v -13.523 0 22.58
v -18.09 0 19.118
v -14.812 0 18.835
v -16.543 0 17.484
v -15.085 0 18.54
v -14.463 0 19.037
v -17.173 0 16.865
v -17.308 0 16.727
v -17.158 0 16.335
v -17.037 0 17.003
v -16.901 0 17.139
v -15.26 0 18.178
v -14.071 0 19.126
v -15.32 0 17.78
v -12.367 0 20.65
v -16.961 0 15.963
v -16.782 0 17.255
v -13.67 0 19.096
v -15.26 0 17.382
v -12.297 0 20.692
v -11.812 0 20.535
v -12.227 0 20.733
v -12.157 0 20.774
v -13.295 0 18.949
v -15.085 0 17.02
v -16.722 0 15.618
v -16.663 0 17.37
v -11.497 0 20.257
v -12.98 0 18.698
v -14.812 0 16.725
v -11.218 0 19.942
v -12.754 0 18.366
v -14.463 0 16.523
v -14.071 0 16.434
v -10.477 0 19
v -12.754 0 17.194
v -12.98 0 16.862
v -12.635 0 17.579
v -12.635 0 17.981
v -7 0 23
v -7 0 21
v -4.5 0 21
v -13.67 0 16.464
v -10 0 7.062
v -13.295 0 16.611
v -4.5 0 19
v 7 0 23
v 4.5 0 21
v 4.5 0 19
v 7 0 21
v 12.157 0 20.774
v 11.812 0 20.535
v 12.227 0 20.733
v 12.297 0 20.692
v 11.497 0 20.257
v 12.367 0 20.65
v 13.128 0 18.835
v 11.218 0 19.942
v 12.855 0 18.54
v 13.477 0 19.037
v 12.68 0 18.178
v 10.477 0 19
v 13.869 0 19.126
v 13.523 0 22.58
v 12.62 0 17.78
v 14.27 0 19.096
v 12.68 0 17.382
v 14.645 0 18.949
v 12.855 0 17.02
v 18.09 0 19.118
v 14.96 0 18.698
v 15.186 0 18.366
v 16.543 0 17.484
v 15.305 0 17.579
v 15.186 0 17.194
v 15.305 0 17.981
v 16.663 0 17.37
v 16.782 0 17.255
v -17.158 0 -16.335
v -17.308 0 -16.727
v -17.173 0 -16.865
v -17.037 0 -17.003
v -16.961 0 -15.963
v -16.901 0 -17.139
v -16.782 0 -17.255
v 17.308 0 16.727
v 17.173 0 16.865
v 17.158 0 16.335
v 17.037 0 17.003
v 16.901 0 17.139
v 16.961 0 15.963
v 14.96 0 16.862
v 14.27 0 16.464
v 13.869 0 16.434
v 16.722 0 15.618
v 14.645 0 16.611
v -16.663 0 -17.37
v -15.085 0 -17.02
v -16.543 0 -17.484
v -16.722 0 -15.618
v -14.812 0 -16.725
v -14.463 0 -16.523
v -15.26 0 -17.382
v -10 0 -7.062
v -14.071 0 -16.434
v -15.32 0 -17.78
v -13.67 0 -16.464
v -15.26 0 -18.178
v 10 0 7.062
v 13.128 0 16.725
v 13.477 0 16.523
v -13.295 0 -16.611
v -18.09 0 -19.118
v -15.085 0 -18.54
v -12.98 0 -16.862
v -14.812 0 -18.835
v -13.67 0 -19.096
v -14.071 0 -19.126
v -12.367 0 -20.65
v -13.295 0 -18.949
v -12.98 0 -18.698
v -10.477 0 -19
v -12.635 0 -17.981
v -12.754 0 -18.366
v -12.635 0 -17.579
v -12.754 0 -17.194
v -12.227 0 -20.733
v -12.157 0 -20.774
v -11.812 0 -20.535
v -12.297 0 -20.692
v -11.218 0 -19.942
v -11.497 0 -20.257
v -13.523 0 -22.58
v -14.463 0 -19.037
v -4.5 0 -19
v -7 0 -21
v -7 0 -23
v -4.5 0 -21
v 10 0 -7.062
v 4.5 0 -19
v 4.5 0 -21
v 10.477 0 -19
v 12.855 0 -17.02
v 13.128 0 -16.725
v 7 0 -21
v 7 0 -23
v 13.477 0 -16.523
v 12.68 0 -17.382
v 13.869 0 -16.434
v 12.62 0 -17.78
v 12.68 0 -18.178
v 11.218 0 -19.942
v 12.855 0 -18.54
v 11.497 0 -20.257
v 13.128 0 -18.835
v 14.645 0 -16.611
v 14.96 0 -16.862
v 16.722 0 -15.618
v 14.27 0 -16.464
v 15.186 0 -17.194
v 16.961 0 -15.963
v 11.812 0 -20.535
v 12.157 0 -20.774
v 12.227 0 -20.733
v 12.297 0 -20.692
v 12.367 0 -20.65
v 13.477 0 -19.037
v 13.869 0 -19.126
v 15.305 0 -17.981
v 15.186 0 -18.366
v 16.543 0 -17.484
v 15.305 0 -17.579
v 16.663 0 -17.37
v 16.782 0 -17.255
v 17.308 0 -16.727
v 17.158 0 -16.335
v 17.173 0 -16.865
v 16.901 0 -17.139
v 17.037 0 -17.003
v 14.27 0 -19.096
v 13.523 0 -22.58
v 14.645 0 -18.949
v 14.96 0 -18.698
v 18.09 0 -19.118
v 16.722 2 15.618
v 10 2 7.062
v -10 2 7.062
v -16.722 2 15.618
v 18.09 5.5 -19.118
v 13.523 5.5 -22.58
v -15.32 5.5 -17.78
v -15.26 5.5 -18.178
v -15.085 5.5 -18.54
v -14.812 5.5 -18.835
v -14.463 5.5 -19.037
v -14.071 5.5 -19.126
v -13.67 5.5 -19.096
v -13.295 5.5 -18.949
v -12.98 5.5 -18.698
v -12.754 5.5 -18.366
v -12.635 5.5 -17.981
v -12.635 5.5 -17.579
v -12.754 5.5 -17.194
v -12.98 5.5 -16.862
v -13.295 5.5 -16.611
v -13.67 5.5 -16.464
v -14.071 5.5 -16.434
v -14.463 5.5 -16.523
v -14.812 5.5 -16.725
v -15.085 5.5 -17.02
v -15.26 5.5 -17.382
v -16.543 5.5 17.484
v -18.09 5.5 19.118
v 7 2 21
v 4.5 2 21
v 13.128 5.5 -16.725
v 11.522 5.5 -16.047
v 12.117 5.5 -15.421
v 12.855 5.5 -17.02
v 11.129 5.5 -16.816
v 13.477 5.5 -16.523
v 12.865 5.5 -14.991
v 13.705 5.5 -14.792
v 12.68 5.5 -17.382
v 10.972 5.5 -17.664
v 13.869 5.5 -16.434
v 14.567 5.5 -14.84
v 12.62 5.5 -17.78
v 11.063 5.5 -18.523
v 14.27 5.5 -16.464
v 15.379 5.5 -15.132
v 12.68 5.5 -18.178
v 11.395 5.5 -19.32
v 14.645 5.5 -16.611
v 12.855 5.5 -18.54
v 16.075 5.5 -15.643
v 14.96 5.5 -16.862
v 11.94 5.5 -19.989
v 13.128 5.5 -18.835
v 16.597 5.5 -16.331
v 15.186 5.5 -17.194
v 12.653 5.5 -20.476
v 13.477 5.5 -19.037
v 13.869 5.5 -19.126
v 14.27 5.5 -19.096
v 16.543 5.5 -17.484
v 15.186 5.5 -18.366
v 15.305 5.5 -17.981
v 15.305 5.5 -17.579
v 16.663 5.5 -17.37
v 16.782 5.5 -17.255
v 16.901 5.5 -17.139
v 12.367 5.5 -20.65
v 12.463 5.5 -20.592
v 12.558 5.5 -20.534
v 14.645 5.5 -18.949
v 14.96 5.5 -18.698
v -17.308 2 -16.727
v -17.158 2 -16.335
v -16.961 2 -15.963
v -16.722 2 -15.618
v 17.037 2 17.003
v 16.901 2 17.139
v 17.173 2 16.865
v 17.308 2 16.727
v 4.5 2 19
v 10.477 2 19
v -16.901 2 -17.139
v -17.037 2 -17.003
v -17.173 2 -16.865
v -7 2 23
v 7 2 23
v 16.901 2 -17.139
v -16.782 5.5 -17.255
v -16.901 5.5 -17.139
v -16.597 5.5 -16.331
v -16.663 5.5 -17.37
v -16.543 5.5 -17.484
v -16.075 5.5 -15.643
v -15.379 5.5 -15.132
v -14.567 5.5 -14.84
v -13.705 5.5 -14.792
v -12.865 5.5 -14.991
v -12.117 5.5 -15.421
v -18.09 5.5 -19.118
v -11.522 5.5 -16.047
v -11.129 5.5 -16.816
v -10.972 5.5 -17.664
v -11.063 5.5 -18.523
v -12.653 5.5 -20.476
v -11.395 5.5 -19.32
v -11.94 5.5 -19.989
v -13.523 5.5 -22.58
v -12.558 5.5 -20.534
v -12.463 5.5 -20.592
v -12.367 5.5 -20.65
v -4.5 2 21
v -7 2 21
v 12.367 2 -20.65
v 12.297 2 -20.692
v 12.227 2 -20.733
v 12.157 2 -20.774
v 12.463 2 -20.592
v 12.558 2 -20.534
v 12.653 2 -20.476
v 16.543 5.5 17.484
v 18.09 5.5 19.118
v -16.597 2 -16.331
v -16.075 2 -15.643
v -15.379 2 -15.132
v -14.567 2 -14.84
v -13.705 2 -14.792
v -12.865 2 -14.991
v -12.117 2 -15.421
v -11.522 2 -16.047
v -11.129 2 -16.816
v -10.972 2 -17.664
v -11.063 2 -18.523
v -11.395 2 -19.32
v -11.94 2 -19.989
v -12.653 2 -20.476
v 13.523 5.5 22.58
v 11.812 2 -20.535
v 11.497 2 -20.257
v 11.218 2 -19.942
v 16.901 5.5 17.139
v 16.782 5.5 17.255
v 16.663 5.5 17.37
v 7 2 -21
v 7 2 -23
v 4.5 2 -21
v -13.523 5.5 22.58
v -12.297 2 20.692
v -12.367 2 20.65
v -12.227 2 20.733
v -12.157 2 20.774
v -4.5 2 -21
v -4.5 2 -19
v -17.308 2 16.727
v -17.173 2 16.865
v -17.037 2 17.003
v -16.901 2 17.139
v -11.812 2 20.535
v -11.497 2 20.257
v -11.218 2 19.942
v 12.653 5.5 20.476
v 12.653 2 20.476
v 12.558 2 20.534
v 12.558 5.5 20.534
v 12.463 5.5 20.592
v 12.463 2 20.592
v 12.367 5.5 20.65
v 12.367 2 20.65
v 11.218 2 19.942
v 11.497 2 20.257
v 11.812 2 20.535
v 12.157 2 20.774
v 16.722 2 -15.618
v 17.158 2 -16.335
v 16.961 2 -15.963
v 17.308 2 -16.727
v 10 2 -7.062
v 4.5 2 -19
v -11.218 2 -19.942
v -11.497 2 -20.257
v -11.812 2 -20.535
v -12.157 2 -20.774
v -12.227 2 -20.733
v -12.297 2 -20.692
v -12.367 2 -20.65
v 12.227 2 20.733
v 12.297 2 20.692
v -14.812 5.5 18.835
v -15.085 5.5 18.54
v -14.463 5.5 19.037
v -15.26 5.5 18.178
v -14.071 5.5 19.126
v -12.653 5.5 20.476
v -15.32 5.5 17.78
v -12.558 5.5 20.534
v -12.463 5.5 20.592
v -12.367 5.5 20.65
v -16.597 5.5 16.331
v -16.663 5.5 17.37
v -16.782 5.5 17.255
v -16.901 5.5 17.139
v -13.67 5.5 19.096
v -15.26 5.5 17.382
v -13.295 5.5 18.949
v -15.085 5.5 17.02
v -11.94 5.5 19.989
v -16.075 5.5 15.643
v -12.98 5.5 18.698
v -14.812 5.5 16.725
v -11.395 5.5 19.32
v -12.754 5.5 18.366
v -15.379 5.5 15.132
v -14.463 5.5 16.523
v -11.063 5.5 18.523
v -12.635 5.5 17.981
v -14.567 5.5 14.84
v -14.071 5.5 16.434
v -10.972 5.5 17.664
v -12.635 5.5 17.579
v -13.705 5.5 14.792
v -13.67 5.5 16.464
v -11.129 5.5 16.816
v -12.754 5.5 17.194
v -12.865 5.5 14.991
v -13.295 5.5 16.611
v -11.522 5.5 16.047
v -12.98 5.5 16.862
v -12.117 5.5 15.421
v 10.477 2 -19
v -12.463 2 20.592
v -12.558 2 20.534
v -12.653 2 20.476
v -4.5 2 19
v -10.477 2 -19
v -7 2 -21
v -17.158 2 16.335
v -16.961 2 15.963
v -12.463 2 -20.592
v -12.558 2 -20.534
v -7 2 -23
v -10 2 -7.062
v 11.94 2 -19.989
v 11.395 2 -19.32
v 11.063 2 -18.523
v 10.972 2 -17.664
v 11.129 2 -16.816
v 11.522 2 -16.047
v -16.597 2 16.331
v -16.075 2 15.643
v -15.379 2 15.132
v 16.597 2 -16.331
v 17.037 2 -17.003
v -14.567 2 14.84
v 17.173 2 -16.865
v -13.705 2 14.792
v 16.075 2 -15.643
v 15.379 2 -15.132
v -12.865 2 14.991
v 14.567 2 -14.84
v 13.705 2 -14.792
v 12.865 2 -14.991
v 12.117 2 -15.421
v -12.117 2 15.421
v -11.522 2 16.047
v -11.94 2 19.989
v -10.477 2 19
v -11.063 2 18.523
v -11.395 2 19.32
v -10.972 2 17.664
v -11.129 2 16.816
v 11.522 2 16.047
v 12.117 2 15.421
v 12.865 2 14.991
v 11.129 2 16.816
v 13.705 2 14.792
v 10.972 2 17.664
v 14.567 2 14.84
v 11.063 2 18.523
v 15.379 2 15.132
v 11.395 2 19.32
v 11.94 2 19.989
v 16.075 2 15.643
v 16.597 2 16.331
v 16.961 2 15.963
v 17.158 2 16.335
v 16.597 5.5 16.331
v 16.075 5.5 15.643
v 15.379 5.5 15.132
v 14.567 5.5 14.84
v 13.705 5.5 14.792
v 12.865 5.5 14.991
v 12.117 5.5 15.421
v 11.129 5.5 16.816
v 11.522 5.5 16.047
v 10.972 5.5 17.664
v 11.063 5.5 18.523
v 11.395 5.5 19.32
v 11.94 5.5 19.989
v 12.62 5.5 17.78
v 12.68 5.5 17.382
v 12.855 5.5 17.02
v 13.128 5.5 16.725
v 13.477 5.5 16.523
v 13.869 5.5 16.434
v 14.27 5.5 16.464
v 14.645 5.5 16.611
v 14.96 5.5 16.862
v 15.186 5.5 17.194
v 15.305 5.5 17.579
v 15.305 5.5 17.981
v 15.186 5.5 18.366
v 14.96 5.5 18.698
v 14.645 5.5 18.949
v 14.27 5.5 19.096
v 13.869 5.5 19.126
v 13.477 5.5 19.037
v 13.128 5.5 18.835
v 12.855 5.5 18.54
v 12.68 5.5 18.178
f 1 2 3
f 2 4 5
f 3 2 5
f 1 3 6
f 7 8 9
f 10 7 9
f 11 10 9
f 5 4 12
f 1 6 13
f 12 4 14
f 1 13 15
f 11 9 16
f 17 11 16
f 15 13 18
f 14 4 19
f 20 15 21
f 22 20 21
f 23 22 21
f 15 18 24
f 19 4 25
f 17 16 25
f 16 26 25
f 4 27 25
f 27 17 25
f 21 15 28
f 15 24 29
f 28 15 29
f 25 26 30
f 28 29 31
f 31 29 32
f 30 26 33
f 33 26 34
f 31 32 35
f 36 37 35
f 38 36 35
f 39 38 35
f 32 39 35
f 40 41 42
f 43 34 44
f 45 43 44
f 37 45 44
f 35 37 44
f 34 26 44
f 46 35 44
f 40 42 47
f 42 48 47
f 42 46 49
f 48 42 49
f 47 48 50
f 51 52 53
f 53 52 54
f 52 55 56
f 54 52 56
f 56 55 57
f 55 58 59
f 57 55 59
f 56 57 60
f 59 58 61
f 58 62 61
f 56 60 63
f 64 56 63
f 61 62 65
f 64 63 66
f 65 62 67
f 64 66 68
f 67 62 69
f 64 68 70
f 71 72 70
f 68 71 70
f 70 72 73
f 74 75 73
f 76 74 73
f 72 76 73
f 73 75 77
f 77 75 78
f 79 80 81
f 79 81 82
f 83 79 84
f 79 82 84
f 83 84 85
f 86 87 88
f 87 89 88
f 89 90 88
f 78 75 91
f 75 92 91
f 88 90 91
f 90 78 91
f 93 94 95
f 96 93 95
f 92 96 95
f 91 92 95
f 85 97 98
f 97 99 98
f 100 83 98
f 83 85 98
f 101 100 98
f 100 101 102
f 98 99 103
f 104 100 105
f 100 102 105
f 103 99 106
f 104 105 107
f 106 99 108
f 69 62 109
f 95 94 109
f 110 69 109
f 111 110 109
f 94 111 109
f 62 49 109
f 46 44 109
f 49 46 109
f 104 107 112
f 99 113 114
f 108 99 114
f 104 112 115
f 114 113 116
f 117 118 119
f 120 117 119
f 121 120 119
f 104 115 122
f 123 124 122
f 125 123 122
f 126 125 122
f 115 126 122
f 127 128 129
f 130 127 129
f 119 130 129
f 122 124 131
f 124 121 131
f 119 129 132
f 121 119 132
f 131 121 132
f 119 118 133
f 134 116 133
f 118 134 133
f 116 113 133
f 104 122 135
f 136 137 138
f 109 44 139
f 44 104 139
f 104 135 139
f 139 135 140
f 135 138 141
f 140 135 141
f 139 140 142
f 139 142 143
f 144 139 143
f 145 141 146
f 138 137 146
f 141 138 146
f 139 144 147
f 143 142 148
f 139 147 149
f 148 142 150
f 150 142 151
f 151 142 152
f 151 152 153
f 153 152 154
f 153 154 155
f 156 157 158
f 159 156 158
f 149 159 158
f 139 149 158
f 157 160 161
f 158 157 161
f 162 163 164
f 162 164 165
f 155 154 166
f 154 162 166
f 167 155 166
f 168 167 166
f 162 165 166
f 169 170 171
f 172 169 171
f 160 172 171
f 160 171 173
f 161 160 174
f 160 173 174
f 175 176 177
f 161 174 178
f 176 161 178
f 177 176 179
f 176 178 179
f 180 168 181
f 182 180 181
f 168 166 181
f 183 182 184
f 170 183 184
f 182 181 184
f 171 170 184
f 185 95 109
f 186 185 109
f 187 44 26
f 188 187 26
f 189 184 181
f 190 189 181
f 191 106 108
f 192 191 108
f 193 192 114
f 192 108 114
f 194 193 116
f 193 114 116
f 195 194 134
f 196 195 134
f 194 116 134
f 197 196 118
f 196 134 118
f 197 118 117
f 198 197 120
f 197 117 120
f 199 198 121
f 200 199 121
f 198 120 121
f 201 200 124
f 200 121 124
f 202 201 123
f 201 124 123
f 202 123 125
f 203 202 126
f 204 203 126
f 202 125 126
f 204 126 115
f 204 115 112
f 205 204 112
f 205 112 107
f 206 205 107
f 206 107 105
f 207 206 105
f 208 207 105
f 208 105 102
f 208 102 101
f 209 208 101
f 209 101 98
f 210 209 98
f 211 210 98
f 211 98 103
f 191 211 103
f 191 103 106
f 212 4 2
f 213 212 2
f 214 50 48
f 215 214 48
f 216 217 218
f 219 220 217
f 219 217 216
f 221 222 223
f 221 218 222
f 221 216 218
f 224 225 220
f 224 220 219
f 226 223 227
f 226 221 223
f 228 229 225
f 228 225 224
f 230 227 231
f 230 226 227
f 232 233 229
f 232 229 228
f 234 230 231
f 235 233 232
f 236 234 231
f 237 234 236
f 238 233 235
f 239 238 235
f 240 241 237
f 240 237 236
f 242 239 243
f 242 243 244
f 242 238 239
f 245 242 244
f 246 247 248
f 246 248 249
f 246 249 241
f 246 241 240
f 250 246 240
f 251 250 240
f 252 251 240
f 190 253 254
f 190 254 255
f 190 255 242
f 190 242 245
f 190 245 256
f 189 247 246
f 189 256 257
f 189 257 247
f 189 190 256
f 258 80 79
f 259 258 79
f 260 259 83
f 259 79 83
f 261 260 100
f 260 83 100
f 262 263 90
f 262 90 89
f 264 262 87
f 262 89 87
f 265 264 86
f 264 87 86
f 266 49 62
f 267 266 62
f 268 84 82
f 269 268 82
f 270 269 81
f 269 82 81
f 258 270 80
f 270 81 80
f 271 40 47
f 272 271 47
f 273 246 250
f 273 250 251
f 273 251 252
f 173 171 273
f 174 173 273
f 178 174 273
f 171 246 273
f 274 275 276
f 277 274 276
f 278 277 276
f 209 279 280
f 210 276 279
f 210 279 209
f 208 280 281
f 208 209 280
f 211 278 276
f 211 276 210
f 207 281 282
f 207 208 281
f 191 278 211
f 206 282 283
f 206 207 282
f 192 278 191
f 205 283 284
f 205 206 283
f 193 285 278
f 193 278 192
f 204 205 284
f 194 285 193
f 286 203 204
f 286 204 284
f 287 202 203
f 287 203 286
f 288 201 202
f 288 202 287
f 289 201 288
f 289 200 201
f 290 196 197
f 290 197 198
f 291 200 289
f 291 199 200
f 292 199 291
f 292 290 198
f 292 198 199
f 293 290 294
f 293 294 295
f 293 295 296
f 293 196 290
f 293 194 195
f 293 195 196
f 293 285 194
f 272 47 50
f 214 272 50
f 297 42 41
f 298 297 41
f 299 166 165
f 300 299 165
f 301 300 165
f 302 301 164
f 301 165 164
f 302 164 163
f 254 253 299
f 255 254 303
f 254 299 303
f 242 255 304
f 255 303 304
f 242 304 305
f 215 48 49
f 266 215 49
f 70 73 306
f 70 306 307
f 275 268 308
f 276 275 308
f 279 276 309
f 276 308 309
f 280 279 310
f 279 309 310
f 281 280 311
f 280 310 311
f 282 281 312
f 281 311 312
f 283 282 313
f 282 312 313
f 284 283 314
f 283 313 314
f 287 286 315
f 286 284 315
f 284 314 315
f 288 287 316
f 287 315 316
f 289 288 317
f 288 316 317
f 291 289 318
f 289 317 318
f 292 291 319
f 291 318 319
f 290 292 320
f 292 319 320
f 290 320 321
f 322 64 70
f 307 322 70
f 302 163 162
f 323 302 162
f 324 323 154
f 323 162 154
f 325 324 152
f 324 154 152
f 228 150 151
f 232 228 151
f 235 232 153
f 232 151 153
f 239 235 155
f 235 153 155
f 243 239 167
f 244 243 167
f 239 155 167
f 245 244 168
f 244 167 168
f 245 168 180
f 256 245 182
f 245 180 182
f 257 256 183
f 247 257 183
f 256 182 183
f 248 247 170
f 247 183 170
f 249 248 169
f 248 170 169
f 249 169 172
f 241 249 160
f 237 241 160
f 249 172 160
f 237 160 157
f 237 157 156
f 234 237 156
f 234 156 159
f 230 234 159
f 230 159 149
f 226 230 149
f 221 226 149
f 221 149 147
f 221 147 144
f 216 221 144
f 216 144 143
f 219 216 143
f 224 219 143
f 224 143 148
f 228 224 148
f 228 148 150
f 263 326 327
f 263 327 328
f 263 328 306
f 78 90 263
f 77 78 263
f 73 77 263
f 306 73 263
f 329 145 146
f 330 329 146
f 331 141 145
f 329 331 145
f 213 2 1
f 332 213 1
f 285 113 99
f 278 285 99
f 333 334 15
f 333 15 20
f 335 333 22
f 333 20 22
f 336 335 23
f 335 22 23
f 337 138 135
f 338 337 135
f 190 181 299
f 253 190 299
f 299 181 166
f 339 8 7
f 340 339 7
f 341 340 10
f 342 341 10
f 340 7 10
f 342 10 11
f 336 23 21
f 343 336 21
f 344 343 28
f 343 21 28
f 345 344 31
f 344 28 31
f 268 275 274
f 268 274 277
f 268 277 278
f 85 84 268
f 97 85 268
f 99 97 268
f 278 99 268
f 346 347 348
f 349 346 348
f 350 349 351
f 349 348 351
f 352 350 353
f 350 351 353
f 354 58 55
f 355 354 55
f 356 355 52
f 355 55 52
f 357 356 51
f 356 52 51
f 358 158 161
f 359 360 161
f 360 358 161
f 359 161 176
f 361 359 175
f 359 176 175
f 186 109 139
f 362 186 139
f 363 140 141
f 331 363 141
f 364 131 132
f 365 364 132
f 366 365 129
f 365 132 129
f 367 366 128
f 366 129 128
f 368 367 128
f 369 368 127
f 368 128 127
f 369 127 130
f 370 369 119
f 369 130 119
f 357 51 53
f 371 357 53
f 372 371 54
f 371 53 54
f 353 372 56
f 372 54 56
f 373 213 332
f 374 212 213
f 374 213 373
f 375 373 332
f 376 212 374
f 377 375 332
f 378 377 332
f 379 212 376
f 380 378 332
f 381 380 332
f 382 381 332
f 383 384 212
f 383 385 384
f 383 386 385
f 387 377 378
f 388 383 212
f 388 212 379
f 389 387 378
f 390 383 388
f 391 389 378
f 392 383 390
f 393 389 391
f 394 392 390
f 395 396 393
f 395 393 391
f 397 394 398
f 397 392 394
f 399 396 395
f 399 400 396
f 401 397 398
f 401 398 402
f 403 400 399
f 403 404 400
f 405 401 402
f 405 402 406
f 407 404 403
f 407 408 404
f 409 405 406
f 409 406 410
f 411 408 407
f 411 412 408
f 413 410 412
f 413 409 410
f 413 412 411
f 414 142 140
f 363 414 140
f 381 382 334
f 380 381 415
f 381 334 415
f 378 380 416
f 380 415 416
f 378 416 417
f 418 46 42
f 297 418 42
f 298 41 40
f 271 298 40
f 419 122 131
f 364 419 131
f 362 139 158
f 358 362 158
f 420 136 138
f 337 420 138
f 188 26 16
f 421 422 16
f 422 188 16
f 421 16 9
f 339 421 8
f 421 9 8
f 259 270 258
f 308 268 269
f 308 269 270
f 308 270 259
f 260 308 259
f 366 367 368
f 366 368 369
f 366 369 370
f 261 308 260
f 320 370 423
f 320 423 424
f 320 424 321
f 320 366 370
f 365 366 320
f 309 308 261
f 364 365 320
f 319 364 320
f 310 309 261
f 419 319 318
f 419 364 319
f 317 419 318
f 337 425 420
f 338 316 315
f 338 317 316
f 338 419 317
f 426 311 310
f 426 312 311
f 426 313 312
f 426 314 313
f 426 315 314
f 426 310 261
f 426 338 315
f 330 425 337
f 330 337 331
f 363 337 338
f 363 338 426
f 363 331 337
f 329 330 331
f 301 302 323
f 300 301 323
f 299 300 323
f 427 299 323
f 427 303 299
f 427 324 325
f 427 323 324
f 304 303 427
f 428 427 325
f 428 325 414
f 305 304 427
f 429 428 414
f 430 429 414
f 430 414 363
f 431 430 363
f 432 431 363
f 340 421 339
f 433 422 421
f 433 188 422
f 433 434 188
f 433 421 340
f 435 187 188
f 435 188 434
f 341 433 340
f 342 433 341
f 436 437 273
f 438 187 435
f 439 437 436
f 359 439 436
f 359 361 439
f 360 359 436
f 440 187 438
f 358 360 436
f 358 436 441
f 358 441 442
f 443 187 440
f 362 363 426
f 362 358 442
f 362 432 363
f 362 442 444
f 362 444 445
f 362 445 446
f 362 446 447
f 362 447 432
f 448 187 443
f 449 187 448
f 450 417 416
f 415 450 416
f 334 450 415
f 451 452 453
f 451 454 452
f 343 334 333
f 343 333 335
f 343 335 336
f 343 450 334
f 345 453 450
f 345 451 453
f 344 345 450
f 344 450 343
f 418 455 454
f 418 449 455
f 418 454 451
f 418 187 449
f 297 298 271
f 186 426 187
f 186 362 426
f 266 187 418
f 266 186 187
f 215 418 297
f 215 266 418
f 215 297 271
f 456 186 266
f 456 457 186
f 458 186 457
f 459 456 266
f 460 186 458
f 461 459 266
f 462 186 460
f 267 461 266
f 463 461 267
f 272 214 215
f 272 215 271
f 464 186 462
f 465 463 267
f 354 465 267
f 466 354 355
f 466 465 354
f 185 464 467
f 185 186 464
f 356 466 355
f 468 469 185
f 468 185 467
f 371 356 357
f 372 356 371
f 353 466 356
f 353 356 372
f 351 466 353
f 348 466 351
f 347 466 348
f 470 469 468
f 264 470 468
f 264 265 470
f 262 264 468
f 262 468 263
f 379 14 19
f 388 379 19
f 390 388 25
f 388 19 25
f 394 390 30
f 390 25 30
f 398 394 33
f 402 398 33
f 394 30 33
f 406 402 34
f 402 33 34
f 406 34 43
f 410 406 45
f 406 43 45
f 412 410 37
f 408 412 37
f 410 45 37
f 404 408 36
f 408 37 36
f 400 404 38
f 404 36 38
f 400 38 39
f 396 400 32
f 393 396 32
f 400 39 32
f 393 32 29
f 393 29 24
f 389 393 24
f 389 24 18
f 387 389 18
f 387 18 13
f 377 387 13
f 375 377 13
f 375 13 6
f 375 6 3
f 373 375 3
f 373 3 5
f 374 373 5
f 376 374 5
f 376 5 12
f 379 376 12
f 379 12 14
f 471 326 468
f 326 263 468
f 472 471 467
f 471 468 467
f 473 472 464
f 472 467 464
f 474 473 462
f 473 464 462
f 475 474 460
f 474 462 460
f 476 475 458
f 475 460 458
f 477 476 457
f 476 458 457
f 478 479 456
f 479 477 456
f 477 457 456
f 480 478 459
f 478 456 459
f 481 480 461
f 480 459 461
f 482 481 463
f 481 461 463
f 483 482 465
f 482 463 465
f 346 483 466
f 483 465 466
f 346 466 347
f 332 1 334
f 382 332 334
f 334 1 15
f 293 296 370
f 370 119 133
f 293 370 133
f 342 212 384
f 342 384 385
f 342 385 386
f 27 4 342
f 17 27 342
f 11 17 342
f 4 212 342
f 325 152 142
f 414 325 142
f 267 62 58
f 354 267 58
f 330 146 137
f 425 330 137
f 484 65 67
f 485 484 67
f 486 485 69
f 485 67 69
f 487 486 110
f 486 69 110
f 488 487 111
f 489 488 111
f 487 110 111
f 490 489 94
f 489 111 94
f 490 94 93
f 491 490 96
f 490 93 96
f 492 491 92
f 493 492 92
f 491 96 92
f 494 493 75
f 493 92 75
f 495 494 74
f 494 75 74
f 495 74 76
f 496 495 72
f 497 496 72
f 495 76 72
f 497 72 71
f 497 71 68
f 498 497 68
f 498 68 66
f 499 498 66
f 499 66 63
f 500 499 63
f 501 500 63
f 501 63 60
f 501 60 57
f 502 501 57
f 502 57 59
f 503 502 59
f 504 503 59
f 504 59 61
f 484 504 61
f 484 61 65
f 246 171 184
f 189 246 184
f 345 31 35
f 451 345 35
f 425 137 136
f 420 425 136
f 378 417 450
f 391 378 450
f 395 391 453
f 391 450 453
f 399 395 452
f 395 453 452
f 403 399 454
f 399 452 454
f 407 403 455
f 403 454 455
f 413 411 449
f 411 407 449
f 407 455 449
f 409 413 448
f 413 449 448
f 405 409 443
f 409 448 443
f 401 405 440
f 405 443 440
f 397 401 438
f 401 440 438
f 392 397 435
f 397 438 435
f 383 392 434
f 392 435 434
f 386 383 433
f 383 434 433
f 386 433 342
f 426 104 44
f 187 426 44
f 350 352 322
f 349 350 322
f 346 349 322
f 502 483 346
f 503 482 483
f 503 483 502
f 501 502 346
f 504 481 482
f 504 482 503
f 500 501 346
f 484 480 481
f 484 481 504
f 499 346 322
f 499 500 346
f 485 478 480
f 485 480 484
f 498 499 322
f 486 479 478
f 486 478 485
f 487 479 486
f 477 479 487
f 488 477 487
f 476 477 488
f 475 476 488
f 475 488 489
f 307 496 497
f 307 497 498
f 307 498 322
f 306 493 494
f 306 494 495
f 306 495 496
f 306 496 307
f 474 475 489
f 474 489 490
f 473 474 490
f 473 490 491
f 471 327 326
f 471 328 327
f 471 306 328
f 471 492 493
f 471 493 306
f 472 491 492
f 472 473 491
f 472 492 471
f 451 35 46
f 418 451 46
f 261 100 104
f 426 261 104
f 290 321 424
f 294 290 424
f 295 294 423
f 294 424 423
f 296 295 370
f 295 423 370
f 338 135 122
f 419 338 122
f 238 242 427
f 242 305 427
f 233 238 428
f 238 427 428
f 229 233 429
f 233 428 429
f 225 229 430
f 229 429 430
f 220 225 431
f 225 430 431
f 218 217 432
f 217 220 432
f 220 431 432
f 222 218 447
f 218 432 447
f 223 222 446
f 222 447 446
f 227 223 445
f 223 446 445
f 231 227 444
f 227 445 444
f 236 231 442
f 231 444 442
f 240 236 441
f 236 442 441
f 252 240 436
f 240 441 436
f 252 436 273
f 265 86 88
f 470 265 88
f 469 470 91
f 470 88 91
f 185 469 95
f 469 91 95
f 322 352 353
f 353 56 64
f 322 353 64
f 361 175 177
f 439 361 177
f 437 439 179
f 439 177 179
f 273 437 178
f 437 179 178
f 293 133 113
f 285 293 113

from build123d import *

# Parameters (mm, degrees)
SKETCH1_R               = 24.07
BOSS_EXTRUDE1_DEPTH     = 2
BOSS_EXTRUDE2_DEPTH     = 5.5
BOSS_EXTRUDE5_REACH     = 36.482
SKETCH2_R               = 3
SKETCH1_5_R             = 34.31362745
CUT_EXTRUDE3_DEPTH      = 35.48158639
CUT_EXTRUDE3_DEPTH_BACK = 35.48158639
M2_5_CLEARANCE_HOLE1_D  = 2.7
CUT_EXTRUDE4_DEPTH      = 35.48158639


with BuildPart() as part:
    # Sketch1 → Boss-Extrude1 (new body)
    with BuildSketch(Plane(origin=(0, 0, 0), x_dir=(1, 0, 0), z_dir=(0, 1, 0))):
        with Locations(Location((0, 0, 0), (0, 0, 270))):
            Circle(SKETCH1_R)
    extrude(amount=BOSS_EXTRUDE1_DEPTH)

    # Sketch1<3> → Boss-Extrude2 (add)
    with BuildSketch(Plane(origin=(0, 0, 0), x_dir=(1, 0, 0), z_dir=(0, 1, 0))):
        with BuildLine():
            ThreePointArc((12.366915807, 20.650043424), (14.541516735, 19.180959075), (16.543257949, 17.483864459))
            Line((16.543257949, 17.483864459), (18.089781085, 19.118318867))
            Line((18.089781085, 19.118318867), (13.523019488, 22.580483607))
            Line((13.523019488, 22.580483607), (12.366915807, 20.650043424))
        make_face()
        with BuildLine():
            ThreePointArc((16.543257949, -17.483864459), (14.541516735, -19.180959075), (12.366915807, -20.650043424))
            Line((12.366915807, -20.650043424), (13.523019488, -22.580483607))
            Line((13.523019488, -22.580483607), (18.089781085, -19.118318867))
            Line((18.089781085, -19.118318867), (16.543257949, -17.483864459))
        make_face()
        with BuildLine():
            ThreePointArc((-16.543257949, 17.483864459), (-14.541516735, 19.180959075), (-12.366915807, 20.650043424))
            Line((-12.366915807, 20.650043424), (-13.523019488, 22.580483607))
            Line((-13.523019488, 22.580483607), (-18.089781085, 19.118318867))
            Line((-18.089781085, 19.118318867), (-16.543257949, 17.483864459))
        make_face()
        with BuildLine():
            ThreePointArc((-12.366915807, -20.650043424), (-14.541516735, -19.180959075), (-16.543257949, -17.483864459))
            Line((-16.543257949, -17.483864459), (-18.089781085, -19.118318867))
            Line((-18.089781085, -19.118318867), (-13.523019488, -22.580483607))
            Line((-13.523019488, -22.580483607), (-12.366915807, -20.650043424))
        make_face()
    extrude(amount=BOSS_EXTRUDE2_DEPTH)

    # Boss-Extrude5: up to this face of the body (flat: up to its plane)
    boss_extrude5_end = Plane(part.part.faces().sort_by_distance((15.168468653, 5.5, 20.00793877))[0])
    # Sketch2 → Boss-Extrude5 (add, up to the picked face)
    with BuildSketch(Plane(origin=(0, 0, 0), x_dir=(1, 0, 0), z_dir=(0, 1, 0)), mode=Mode.PRIVATE) as boss_extrude5_sk1:
        with Locations((13.97, 17.78)):
            Circle(SKETCH2_R)
    boss_extrude5_tool1 = split(extrude(boss_extrude5_sk1.sketch, amount=BOSS_EXTRUDE5_REACH, mode=Mode.PRIVATE), bisect_by=boss_extrude5_end, keep=Keep.BOTH, mode=Mode.PRIVATE)
    # Sketch2 → Boss-Extrude5 (add, up to the picked face)
    with BuildSketch(Plane(origin=(0, 0, 0), x_dir=(1, 0, 0), z_dir=(0, 1, 0)), mode=Mode.PRIVATE) as boss_extrude5_sk2:
        with Locations((13.97, -17.78)):
            Circle(SKETCH2_R)
    boss_extrude5_tool2 = split(extrude(boss_extrude5_sk2.sketch, amount=BOSS_EXTRUDE5_REACH, mode=Mode.PRIVATE), bisect_by=boss_extrude5_end, keep=Keep.BOTH, mode=Mode.PRIVATE)
    # Sketch2 → Boss-Extrude5 (add, up to the picked face)
    with BuildSketch(Plane(origin=(0, 0, 0), x_dir=(1, 0, 0), z_dir=(0, 1, 0)), mode=Mode.PRIVATE) as boss_extrude5_sk3:
        with Locations((-13.97, -17.78)):
            Circle(SKETCH2_R)
    boss_extrude5_tool3 = split(extrude(boss_extrude5_sk3.sketch, amount=BOSS_EXTRUDE5_REACH, mode=Mode.PRIVATE), bisect_by=boss_extrude5_end, keep=Keep.BOTH, mode=Mode.PRIVATE)
    # Sketch2 → Boss-Extrude5 (add, up to the picked face)
    with BuildSketch(Plane(origin=(0, 0, 0), x_dir=(1, 0, 0), z_dir=(0, 1, 0)), mode=Mode.PRIVATE) as boss_extrude5_sk4:
        with Locations((-13.97, 17.78)):
            Circle(SKETCH2_R)
    boss_extrude5_tool4 = split(extrude(boss_extrude5_sk4.sketch, amount=BOSS_EXTRUDE5_REACH, mode=Mode.PRIVATE), bisect_by=boss_extrude5_end, keep=Keep.BOTH, mode=Mode.PRIVATE)
    add(boss_extrude5_tool1.solids().sort_by(Axis((13.97, 0, -17.78), (0, 1, 0)))[0])
    add(boss_extrude5_tool2.solids().sort_by(Axis((13.97, 0, 17.78), (0, 1, 0)))[0])
    add(boss_extrude5_tool3.solids().sort_by(Axis((-13.97, 0, 17.78), (0, 1, 0)))[0])
    add(boss_extrude5_tool4.solids().sort_by(Axis((-13.97, 0, -17.78), (0, 1, 0)))[0])

    # Sketch1<5> → Cut-Extrude3 (cut, two sides)
    with BuildSketch(Plane(origin=(0, 0, 0), x_dir=(1, 0, 0), z_dir=(0, 1, 0))) as cut_extrude3_sk:
        Circle(SKETCH1_5_R)
        with BuildLine():
            Line((18.089781085, 19.118318867), (16.543257949, 17.483864459))
            ThreePointArc((16.543257949, 17.483864459), (22.108382108, 9.517580605), (24.07, 0))
            ThreePointArc((24.07, 0), (22.108382108, -9.517580605), (16.543257949, -17.483864459))
            Line((16.543257949, -17.483864459), (18.089781085, -19.118318867))
            Line((18.089781085, -19.118318867), (13.523019488, -22.580483607))
            Line((13.523019488, -22.580483607), (12.366915807, -20.650043424))
            ThreePointArc((12.366915807, -20.650043424), (0, -24.07), (-12.366915807, -20.650043424))
            Line((-12.366915807, -20.650043424), (-13.523019488, -22.580483607))
            Line((-13.523019488, -22.580483607), (-18.089781085, -19.118318867))
            Line((-18.089781085, -19.118318867), (-16.543257949, -17.483864459))
            ThreePointArc((-16.543257949, -17.483864459), (-24.07, 0), (-16.543257949, 17.483864459))
            Line((-16.543257949, 17.483864459), (-18.089781085, 19.118318867))
            Line((-18.089781085, 19.118318867), (-13.523019488, 22.580483607))
            Line((-13.523019488, 22.580483607), (-12.366915807, 20.650043424))
            ThreePointArc((-12.366915807, 20.650043424), (0, 24.07), (12.366915807, 20.650043424))
            Line((12.366915807, 20.650043424), (13.523019488, 22.580483607))
            Line((13.523019488, 22.580483607), (18.089781085, 19.118318867))
        make_face(mode=Mode.SUBTRACT)
    extrude(amount=CUT_EXTRUDE3_DEPTH, mode=Mode.SUBTRACT)
    extrude(cut_extrude3_sk.sketch, amount=-CUT_EXTRUDE3_DEPTH_BACK, mode=Mode.SUBTRACT)

    # M2.5 Clearance Hole1 (through all)
    with Locations(Plane(origin=(0, 5.5, 0), x_dir=(1, 0, 0), z_dir=(0, 1, 0))):
        with Locations((-13.97, 17.78), (13.97, 17.78), (13.97, -17.78), (-13.97, -17.78)):
            Hole(M2_5_CLEARANCE_HOLE1_D / 2)

    # Sketch8 → Cut-Extrude4 (cut, through all)
    with BuildSketch(Plane.XZ):
        with BuildLine():
            ThreePointArc((-12.157407277, 20.77407876), (-11.650071144, 20.400673597), (-11.217885814, 19.942375432))
            Line((-11.217885814, 19.942375432), (-10.477447975, 19))
            Line((-10.477447975, 19), (-4.5, 19))
            Line((-4.5, 19), (-4.5, 21))
            Line((-4.5, 21), (-7, 21))
            Line((-7, 21), (-7, 23))
            Line((-7, 23), (7, 23))
            Line((7, 23), (7, 21))
            Line((7, 21), (4.5, 21))
            Line((4.5, 21), (4.5, 19))
            Line((4.5, 19), (10.477447975, 19))
            Line((10.477447975, 19), (11.217885814, 19.942375432))
            ThreePointArc((11.217885814, 19.942375432), (11.650071144, 20.400673597), (12.157407277, 20.77407876))
            ThreePointArc((12.157407277, 20.77407876), (0, 24.07), (-12.157407277, 20.77407876))
        make_face()
        with BuildLine():
            Line((10, 7.062206513), (10, -7.062206513))
            Line((10, -7.062206513), (16.722114186, -15.617624568))
            ThreePointArc((16.722114186, -15.617624568), (17.065148682, -16.145969817), (17.307920228, -16.727247155))
            ThreePointArc((17.307920228, -16.727247155), (24.07, 0), (17.307920228, 16.727247155))
            ThreePointArc((17.307920228, 16.727247155), (17.065148682, 16.145969817), (16.722114186, 15.617624568))
            Line((16.722114186, 15.617624568), (10, 7.062206513))
        make_face()
        with BuildLine():
            Line((-10, -7.062206513), (-10, 7.062206513))
            Line((-10, 7.062206513), (-16.722114186, 15.617624568))
            ThreePointArc((-16.722114186, 15.617624568), (-17.065148682, 16.145969817), (-17.307920228, 16.727247155))
            ThreePointArc((-17.307920228, 16.727247155), (-24.07, 0), (-17.307920228, -16.727247155))
            ThreePointArc((-17.307920228, -16.727247155), (-17.065148682, -16.145969817), (-16.722114186, -15.617624568))
            Line((-16.722114186, -15.617624568), (-10, -7.062206513))
        make_face()
        with BuildLine():
            Line((11.217885814, -19.942375432), (10.477447975, -19))
            Line((10.477447975, -19), (4.5, -19))
            Line((4.5, -19), (4.5, -21))
            Line((4.5, -21), (7, -21))
            Line((7, -21), (7, -23))
            Line((7, -23), (-7, -23))
            Line((-7, -23), (-7, -21))
            Line((-7, -21), (-4.5, -21))
            Line((-4.5, -21), (-4.5, -19))
            Line((-4.5, -19), (-10.477447975, -19))
            Line((-10.477447975, -19), (-11.217885814, -19.942375432))
            ThreePointArc((-11.217885814, -19.942375432), (-11.650071144, -20.400673597), (-12.157407277, -20.77407876))
            ThreePointArc((-12.157407277, -20.77407876), (0, -24.07), (12.157407277, -20.77407876))
            ThreePointArc((12.157407277, -20.77407876), (11.650071144, -20.400673597), (11.217885814, -19.942375432))
        make_face()
    extrude(amount=-CUT_EXTRUDE4_DEPTH, mode=Mode.SUBTRACT)


solid = part.part
